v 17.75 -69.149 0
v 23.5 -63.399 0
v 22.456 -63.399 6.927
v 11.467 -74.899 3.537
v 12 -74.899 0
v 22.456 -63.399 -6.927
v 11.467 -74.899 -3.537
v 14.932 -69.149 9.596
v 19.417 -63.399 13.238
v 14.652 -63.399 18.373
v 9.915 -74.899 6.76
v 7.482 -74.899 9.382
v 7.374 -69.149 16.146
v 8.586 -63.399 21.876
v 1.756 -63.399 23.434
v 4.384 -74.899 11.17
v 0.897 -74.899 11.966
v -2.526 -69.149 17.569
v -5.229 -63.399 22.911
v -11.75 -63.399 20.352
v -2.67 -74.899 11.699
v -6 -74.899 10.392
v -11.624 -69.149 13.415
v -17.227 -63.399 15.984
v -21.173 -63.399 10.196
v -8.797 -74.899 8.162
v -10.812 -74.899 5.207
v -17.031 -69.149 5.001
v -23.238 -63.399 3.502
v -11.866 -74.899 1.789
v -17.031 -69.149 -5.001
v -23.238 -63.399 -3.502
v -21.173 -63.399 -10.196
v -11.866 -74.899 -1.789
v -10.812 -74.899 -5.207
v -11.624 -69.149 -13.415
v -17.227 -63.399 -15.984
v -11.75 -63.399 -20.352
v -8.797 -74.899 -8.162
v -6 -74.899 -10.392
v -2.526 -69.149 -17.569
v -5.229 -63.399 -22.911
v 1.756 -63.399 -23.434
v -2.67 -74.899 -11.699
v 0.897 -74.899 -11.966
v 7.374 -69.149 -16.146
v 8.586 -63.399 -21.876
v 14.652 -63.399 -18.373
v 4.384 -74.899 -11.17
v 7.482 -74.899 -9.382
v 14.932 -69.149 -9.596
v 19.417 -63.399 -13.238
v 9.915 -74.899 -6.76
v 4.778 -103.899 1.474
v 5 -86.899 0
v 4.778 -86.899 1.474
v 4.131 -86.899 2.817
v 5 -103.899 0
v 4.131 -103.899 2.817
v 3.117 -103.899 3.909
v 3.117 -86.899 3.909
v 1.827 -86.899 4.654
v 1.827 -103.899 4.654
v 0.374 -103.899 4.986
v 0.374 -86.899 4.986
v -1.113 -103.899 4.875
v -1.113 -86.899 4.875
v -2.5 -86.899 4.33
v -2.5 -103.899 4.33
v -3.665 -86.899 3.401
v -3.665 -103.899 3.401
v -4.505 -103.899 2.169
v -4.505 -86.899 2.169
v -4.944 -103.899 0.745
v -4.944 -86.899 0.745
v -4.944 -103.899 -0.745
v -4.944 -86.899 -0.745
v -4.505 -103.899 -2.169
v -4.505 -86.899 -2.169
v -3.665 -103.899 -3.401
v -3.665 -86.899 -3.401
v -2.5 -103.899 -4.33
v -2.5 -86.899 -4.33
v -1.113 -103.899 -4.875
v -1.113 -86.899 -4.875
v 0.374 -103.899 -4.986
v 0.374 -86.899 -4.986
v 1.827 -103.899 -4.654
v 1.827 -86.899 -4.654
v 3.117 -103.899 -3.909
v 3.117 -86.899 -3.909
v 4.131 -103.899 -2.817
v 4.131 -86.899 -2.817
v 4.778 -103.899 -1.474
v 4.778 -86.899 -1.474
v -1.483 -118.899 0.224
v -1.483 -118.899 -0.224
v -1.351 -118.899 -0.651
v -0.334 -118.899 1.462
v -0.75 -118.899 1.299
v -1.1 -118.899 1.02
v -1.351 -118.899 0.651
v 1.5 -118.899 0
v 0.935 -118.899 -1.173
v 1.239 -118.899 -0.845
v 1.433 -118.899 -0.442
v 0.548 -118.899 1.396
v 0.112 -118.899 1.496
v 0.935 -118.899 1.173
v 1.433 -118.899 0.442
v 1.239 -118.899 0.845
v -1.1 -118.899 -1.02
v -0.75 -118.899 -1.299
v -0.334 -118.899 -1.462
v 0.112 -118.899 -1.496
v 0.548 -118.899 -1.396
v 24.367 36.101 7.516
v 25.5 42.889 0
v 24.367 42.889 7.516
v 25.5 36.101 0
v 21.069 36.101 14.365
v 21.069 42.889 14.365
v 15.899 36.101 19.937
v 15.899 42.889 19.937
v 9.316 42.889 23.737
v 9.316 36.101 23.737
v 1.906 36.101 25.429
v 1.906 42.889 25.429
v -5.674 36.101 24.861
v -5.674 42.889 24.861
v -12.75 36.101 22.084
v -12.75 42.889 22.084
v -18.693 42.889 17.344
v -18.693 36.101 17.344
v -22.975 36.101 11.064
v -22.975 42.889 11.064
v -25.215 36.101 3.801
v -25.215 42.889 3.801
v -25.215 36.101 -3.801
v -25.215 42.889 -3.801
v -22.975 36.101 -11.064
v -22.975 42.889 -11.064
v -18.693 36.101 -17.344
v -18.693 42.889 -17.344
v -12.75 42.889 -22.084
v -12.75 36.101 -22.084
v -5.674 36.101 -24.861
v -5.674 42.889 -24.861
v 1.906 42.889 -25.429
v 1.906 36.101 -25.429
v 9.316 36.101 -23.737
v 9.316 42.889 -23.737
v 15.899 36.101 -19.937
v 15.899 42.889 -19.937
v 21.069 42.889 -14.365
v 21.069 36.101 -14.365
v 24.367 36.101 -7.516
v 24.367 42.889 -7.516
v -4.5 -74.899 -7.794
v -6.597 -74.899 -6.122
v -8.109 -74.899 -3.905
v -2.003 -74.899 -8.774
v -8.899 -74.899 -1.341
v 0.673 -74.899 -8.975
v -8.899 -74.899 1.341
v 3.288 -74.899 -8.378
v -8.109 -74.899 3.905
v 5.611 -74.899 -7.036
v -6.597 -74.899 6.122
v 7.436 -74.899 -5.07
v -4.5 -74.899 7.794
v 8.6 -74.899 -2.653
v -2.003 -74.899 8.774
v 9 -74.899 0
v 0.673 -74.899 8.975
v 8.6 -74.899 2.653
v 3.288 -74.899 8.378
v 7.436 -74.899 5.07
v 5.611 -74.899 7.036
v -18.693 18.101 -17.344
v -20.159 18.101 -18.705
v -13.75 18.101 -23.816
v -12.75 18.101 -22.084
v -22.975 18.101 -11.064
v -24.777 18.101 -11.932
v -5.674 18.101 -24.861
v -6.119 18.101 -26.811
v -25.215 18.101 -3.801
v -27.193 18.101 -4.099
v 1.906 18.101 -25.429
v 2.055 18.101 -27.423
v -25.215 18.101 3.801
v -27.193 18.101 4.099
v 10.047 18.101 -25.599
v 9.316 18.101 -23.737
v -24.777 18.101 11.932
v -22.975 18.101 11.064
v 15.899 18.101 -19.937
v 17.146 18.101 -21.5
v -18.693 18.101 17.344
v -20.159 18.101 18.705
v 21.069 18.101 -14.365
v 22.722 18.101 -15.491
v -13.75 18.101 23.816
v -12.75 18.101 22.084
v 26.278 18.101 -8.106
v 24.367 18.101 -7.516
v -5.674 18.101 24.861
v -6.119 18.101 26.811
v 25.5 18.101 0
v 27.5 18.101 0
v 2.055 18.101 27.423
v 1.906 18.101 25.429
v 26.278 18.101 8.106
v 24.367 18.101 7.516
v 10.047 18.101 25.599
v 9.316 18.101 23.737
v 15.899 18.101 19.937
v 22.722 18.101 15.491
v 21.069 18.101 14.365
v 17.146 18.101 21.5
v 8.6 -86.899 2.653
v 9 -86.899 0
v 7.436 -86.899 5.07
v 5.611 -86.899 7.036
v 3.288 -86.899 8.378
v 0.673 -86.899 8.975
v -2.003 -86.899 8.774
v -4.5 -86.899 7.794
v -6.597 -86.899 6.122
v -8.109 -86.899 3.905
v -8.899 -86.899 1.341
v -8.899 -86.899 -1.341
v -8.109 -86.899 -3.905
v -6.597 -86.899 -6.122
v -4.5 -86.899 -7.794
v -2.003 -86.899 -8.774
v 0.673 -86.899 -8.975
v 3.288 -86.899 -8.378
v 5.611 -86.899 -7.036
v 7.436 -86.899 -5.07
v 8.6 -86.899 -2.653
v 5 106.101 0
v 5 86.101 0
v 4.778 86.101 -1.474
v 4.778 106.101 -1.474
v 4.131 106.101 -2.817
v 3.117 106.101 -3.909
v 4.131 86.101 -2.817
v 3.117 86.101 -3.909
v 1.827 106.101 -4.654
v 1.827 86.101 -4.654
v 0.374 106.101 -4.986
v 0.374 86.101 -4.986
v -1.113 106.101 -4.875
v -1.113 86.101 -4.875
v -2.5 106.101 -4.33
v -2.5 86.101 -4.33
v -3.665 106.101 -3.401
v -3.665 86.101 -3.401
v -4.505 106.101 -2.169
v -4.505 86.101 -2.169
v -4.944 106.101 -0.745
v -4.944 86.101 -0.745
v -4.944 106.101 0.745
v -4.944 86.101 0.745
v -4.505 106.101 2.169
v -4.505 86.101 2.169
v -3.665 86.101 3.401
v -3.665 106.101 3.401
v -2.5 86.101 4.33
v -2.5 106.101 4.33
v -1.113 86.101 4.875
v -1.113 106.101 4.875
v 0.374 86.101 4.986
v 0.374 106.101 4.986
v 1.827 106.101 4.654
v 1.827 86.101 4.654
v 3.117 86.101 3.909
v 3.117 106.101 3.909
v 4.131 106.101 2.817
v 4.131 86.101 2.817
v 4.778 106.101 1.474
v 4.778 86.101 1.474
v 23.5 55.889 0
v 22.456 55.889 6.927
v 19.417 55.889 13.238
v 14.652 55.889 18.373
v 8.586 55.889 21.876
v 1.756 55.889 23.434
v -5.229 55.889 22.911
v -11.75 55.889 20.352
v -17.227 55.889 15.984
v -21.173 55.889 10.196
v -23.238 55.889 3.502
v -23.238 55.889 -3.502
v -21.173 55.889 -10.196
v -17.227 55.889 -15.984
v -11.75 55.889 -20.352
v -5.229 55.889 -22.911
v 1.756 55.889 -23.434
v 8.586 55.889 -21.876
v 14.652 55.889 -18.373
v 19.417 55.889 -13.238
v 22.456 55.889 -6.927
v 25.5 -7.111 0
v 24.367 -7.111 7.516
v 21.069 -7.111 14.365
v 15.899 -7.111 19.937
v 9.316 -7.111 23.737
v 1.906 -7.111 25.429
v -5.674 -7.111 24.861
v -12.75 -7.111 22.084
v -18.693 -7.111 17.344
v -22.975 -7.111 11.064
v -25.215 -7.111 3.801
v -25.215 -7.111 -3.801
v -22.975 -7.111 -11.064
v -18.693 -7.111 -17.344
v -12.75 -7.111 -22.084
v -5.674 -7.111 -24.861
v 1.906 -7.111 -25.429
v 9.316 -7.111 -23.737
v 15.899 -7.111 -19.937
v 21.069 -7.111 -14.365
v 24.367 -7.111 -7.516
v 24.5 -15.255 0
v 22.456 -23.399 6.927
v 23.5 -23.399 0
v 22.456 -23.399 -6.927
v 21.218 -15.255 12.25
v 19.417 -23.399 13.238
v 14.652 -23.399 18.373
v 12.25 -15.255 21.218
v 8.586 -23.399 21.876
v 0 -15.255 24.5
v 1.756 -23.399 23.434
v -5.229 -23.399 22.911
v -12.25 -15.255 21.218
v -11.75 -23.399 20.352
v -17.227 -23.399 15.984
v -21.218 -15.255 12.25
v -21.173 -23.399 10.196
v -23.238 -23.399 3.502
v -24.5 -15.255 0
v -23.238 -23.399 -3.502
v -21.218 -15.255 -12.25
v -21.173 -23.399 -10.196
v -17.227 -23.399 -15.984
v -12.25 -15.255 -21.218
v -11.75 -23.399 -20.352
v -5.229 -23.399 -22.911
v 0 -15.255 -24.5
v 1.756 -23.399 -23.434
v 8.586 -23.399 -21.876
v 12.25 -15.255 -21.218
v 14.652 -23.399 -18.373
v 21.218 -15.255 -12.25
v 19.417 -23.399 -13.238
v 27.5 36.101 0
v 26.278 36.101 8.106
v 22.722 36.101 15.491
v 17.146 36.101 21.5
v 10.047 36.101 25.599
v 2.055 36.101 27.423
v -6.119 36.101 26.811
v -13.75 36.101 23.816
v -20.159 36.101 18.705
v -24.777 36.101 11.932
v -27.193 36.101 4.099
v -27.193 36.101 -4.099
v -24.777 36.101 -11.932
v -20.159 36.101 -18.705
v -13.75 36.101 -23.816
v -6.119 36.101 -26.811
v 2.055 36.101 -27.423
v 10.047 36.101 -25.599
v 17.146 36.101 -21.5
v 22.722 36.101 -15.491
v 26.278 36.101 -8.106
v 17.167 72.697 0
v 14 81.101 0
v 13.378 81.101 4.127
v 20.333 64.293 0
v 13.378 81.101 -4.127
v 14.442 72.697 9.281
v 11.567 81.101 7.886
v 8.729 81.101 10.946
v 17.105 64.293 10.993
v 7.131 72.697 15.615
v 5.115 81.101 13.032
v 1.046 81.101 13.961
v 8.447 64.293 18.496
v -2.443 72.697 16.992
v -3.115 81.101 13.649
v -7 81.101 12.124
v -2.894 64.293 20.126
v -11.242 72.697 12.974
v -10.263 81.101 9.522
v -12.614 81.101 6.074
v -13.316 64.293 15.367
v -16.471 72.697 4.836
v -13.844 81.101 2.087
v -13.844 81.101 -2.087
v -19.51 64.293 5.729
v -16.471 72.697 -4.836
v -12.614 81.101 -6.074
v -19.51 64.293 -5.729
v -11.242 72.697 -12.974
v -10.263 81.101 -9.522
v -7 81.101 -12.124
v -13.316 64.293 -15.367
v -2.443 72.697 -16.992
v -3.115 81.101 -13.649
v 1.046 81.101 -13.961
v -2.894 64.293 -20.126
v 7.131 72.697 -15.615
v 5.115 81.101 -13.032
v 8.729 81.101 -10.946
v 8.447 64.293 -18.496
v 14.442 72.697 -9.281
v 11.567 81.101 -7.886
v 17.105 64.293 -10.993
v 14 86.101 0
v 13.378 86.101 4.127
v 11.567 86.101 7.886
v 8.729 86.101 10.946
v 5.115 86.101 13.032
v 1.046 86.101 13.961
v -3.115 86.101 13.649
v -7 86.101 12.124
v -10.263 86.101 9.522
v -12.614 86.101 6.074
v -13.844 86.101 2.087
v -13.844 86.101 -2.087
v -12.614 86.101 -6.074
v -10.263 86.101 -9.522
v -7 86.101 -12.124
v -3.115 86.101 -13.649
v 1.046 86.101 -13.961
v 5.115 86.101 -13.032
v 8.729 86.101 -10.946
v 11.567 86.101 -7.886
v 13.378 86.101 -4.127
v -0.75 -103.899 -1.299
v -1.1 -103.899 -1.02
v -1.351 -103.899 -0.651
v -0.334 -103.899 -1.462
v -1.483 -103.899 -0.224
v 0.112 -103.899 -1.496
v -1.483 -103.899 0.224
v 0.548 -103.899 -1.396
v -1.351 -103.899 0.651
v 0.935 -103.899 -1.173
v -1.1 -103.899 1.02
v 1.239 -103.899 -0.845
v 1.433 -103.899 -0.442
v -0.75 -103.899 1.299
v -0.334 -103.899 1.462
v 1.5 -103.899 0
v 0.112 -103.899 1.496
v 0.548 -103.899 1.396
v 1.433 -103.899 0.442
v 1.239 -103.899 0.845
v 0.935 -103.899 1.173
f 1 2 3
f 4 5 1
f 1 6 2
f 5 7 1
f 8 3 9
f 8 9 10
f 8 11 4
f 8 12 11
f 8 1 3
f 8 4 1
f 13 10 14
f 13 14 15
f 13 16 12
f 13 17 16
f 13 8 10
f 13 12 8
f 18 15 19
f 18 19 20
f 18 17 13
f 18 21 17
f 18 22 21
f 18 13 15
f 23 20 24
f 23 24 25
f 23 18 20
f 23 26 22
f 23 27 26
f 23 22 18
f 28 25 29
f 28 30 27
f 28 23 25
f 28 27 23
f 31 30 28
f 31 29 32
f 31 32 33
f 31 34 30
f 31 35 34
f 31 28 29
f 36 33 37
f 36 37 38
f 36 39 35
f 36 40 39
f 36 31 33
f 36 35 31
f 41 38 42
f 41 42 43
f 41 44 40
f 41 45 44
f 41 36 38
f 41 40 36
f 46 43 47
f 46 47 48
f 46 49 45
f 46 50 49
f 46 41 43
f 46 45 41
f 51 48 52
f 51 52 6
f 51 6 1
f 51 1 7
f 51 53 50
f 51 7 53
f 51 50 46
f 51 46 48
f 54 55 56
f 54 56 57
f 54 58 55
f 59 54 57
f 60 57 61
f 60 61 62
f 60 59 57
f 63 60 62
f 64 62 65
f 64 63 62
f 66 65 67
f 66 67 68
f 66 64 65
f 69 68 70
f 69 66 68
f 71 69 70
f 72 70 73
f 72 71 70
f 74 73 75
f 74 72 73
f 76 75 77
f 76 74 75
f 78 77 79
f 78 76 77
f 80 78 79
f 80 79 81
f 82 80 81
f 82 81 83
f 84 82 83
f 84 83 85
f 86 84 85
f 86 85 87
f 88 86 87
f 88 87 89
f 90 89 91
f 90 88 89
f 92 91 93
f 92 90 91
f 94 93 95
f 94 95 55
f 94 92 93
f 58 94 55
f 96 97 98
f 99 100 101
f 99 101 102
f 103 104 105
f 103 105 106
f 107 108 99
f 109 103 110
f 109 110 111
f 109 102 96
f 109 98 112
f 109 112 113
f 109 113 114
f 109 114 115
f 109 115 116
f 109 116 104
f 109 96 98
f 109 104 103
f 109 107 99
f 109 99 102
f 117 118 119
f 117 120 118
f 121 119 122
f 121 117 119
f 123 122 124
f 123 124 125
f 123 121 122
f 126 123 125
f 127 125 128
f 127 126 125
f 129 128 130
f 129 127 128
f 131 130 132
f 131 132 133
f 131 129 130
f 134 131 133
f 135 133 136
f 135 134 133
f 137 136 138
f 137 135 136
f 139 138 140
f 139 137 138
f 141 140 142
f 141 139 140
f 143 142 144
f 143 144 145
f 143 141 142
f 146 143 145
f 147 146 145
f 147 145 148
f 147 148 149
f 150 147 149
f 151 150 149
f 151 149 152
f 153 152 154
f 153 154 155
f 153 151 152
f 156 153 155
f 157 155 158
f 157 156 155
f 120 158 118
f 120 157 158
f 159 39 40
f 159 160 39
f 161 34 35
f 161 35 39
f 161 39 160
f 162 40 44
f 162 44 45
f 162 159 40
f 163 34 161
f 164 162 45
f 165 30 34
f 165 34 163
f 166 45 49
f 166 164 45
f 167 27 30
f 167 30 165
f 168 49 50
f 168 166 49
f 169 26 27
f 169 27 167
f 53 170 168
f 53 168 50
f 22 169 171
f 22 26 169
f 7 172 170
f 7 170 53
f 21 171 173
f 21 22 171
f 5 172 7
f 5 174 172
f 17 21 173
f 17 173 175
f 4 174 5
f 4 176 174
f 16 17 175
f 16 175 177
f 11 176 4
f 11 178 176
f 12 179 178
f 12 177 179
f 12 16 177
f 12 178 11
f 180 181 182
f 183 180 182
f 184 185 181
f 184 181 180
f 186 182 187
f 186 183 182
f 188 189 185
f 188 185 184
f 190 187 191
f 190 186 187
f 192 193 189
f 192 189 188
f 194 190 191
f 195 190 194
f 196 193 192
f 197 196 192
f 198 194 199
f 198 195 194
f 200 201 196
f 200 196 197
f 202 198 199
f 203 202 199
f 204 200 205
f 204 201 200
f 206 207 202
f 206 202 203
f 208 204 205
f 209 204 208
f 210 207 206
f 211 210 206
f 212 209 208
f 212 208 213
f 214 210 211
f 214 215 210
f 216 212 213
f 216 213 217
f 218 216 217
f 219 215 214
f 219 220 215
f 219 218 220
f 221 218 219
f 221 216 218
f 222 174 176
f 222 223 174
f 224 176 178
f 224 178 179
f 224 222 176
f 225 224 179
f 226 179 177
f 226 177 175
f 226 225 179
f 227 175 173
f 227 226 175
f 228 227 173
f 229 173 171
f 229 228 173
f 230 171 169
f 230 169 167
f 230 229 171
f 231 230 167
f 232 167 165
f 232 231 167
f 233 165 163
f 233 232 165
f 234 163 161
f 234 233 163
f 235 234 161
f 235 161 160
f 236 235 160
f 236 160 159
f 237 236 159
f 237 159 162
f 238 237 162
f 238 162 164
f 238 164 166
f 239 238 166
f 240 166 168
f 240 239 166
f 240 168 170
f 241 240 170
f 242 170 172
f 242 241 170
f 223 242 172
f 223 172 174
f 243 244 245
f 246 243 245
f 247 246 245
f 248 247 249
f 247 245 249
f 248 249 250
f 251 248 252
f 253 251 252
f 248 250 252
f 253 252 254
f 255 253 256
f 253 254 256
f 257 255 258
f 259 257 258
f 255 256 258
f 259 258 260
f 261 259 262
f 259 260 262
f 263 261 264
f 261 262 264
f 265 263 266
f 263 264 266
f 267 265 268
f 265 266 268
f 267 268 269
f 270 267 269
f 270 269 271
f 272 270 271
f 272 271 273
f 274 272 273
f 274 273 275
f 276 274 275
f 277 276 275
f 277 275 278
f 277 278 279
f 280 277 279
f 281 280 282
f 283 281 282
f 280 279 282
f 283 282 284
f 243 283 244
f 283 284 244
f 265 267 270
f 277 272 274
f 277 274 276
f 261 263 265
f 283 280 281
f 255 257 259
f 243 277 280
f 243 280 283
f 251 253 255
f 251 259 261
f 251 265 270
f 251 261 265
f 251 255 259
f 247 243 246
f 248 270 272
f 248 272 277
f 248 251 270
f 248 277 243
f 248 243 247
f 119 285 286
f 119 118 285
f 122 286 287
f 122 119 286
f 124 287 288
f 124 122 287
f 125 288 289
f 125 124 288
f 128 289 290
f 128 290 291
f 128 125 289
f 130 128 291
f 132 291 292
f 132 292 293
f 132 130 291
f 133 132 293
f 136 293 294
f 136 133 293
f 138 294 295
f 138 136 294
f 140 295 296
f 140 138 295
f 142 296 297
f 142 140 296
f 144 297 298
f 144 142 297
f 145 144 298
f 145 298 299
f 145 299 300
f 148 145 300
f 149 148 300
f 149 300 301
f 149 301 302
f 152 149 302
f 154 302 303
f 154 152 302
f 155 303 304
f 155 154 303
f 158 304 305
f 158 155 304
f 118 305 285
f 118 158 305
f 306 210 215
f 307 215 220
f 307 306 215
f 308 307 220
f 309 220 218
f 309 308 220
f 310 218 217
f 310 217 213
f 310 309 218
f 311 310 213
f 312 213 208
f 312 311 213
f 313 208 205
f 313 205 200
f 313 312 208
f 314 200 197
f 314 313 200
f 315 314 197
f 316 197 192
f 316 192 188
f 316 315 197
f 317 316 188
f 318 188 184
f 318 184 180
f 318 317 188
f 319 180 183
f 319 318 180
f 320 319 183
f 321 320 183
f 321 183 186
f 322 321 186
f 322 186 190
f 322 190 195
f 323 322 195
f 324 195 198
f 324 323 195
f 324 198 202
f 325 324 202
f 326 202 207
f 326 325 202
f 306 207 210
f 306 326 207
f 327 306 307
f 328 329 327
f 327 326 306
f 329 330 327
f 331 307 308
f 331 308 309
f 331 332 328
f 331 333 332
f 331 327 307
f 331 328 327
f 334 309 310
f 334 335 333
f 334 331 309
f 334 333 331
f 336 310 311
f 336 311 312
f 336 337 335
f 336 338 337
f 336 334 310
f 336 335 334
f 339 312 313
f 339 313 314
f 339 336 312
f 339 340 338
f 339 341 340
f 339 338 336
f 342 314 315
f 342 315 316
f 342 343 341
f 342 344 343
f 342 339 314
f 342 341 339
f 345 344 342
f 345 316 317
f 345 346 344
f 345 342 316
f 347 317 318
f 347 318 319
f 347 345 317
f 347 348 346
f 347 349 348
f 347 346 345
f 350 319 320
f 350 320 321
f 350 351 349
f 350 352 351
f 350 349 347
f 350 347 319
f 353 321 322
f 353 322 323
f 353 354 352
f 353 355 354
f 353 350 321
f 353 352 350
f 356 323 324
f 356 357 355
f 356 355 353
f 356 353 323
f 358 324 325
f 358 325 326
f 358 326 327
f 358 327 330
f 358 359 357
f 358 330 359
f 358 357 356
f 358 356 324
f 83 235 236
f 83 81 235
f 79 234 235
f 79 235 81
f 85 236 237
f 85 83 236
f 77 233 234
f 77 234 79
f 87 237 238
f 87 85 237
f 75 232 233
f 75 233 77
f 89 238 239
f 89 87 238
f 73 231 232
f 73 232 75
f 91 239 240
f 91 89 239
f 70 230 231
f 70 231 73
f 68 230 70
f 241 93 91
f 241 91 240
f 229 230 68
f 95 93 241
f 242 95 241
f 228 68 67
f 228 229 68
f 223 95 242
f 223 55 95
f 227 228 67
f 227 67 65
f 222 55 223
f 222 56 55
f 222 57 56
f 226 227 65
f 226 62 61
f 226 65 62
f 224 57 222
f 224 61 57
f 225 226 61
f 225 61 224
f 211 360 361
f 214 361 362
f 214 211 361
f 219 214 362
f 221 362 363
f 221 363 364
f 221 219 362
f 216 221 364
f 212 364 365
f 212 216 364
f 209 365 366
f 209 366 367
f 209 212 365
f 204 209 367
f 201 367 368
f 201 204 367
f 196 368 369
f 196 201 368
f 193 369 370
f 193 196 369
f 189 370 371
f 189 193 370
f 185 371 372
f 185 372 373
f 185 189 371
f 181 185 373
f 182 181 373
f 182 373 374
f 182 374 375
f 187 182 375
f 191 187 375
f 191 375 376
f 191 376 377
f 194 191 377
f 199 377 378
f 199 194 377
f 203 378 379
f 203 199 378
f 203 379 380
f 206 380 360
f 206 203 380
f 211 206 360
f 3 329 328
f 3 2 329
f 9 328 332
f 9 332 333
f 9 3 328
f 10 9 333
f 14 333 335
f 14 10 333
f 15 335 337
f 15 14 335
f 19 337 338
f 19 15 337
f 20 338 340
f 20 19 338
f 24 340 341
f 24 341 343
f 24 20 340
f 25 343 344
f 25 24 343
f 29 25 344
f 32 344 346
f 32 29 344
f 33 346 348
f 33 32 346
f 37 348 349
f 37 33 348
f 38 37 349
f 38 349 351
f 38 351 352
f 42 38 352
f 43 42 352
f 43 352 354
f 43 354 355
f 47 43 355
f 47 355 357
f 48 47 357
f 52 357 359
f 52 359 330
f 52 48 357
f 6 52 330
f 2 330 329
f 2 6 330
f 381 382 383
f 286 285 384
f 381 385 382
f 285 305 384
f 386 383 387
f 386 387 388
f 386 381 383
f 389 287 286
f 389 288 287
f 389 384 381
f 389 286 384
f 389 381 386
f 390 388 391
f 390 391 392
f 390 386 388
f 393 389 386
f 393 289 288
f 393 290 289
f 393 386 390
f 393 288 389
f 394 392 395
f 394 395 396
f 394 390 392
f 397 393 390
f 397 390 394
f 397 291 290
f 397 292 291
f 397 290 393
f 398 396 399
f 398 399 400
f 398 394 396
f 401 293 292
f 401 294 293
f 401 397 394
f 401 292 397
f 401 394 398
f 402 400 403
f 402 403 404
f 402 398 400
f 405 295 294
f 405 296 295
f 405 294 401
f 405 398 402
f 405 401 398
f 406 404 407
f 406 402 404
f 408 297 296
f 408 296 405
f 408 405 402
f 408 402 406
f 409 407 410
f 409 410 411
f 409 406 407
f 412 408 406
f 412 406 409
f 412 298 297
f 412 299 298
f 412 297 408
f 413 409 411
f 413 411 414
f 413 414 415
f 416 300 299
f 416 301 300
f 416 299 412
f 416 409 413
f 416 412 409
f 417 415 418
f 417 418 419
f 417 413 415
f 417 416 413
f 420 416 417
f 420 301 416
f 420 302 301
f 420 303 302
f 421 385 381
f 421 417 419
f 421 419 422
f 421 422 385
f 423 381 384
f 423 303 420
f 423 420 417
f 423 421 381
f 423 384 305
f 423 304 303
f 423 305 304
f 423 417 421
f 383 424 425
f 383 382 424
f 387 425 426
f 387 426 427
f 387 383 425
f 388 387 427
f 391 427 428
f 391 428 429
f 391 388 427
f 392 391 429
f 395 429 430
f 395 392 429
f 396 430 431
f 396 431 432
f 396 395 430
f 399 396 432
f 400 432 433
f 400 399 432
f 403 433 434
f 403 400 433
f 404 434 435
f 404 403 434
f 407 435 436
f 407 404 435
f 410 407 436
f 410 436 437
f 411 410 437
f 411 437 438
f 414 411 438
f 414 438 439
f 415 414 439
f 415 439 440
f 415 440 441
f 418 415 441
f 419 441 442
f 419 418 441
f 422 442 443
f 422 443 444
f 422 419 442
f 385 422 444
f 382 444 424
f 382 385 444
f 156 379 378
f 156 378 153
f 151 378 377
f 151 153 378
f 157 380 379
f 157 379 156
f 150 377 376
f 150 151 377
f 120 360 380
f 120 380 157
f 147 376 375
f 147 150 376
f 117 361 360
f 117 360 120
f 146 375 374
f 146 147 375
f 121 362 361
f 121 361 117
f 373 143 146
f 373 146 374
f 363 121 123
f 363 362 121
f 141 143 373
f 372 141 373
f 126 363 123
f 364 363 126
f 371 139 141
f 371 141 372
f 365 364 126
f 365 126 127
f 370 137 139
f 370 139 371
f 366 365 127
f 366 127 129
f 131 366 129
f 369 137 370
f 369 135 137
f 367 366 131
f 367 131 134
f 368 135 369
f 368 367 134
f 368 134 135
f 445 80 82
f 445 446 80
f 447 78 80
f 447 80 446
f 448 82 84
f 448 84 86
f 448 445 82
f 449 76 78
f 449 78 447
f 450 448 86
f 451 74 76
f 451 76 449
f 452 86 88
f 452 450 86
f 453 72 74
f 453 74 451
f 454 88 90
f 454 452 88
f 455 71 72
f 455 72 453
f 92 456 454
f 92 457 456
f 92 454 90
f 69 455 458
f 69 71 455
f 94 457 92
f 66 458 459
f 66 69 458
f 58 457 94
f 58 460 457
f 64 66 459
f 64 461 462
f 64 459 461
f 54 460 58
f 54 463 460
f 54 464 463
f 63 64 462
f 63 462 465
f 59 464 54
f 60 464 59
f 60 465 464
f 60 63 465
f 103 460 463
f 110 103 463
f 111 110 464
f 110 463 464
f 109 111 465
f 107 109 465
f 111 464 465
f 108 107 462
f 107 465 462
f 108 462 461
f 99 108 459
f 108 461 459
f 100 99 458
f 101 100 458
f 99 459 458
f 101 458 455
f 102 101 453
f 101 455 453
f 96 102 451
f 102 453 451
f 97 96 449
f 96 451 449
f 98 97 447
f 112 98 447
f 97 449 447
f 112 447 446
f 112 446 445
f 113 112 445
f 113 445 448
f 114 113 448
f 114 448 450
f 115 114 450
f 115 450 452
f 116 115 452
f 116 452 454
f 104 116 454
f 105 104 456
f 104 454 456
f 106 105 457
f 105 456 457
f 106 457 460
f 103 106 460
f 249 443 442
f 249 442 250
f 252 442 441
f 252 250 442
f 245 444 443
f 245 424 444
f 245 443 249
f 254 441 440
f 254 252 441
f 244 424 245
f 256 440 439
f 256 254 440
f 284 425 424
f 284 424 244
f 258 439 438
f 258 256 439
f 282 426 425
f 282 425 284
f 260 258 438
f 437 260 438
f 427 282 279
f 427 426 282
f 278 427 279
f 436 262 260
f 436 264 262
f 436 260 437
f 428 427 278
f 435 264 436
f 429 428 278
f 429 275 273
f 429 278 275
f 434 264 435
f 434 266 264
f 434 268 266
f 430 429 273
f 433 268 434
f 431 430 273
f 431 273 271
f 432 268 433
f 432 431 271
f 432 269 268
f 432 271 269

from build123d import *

# Parameters (mm, degrees)
SKETCH2_R      = 5
EXTRUDE1_DEPTH = 20
SKETCH3_R      = 1.5
EXTRUDE2_DEPTH = 15


with BuildPart() as part:
    # Sketch1 → Revolve1 (revolve)
    with BuildSketch(Plane.XY):
        Polygon((0, 86.10058483), (14, 86.10058483), (14, 81.10058483), (23.5, 55.889277686), (25.5, 42.889277686), (25.5, 36.10058483), (27.5, 36.10058483), (27.5, 18.10058483), (25.5, 18.10058483), (25.5, -7.110722314), (23.5, -23.39941517), (23.5, -63.39941517), (12, -74.89941517), (9, -74.89941517), (9, -86.89941517), (5, -86.89941517), (5, -103.89941517), (0, -103.89941517), align=None)
    revolve(axis=Axis((0, 86.10058483, 0), (0, -1, 0)))

    # Sketch2 → Extrude1 (add)
    with BuildSketch(Plane(origin=(0, 86.10058483, 0), x_dir=(1, 0, 0), z_dir=(0, 1, 0))):
        Circle(SKETCH2_R)
    extrude(amount=EXTRUDE1_DEPTH)

    # Sketch3 → Extrude2 (add)
    with BuildSketch(Plane.XZ.offset(103.89941517)):
        Circle(SKETCH3_R)
    extrude(amount=EXTRUDE2_DEPTH)


solid = part.part
